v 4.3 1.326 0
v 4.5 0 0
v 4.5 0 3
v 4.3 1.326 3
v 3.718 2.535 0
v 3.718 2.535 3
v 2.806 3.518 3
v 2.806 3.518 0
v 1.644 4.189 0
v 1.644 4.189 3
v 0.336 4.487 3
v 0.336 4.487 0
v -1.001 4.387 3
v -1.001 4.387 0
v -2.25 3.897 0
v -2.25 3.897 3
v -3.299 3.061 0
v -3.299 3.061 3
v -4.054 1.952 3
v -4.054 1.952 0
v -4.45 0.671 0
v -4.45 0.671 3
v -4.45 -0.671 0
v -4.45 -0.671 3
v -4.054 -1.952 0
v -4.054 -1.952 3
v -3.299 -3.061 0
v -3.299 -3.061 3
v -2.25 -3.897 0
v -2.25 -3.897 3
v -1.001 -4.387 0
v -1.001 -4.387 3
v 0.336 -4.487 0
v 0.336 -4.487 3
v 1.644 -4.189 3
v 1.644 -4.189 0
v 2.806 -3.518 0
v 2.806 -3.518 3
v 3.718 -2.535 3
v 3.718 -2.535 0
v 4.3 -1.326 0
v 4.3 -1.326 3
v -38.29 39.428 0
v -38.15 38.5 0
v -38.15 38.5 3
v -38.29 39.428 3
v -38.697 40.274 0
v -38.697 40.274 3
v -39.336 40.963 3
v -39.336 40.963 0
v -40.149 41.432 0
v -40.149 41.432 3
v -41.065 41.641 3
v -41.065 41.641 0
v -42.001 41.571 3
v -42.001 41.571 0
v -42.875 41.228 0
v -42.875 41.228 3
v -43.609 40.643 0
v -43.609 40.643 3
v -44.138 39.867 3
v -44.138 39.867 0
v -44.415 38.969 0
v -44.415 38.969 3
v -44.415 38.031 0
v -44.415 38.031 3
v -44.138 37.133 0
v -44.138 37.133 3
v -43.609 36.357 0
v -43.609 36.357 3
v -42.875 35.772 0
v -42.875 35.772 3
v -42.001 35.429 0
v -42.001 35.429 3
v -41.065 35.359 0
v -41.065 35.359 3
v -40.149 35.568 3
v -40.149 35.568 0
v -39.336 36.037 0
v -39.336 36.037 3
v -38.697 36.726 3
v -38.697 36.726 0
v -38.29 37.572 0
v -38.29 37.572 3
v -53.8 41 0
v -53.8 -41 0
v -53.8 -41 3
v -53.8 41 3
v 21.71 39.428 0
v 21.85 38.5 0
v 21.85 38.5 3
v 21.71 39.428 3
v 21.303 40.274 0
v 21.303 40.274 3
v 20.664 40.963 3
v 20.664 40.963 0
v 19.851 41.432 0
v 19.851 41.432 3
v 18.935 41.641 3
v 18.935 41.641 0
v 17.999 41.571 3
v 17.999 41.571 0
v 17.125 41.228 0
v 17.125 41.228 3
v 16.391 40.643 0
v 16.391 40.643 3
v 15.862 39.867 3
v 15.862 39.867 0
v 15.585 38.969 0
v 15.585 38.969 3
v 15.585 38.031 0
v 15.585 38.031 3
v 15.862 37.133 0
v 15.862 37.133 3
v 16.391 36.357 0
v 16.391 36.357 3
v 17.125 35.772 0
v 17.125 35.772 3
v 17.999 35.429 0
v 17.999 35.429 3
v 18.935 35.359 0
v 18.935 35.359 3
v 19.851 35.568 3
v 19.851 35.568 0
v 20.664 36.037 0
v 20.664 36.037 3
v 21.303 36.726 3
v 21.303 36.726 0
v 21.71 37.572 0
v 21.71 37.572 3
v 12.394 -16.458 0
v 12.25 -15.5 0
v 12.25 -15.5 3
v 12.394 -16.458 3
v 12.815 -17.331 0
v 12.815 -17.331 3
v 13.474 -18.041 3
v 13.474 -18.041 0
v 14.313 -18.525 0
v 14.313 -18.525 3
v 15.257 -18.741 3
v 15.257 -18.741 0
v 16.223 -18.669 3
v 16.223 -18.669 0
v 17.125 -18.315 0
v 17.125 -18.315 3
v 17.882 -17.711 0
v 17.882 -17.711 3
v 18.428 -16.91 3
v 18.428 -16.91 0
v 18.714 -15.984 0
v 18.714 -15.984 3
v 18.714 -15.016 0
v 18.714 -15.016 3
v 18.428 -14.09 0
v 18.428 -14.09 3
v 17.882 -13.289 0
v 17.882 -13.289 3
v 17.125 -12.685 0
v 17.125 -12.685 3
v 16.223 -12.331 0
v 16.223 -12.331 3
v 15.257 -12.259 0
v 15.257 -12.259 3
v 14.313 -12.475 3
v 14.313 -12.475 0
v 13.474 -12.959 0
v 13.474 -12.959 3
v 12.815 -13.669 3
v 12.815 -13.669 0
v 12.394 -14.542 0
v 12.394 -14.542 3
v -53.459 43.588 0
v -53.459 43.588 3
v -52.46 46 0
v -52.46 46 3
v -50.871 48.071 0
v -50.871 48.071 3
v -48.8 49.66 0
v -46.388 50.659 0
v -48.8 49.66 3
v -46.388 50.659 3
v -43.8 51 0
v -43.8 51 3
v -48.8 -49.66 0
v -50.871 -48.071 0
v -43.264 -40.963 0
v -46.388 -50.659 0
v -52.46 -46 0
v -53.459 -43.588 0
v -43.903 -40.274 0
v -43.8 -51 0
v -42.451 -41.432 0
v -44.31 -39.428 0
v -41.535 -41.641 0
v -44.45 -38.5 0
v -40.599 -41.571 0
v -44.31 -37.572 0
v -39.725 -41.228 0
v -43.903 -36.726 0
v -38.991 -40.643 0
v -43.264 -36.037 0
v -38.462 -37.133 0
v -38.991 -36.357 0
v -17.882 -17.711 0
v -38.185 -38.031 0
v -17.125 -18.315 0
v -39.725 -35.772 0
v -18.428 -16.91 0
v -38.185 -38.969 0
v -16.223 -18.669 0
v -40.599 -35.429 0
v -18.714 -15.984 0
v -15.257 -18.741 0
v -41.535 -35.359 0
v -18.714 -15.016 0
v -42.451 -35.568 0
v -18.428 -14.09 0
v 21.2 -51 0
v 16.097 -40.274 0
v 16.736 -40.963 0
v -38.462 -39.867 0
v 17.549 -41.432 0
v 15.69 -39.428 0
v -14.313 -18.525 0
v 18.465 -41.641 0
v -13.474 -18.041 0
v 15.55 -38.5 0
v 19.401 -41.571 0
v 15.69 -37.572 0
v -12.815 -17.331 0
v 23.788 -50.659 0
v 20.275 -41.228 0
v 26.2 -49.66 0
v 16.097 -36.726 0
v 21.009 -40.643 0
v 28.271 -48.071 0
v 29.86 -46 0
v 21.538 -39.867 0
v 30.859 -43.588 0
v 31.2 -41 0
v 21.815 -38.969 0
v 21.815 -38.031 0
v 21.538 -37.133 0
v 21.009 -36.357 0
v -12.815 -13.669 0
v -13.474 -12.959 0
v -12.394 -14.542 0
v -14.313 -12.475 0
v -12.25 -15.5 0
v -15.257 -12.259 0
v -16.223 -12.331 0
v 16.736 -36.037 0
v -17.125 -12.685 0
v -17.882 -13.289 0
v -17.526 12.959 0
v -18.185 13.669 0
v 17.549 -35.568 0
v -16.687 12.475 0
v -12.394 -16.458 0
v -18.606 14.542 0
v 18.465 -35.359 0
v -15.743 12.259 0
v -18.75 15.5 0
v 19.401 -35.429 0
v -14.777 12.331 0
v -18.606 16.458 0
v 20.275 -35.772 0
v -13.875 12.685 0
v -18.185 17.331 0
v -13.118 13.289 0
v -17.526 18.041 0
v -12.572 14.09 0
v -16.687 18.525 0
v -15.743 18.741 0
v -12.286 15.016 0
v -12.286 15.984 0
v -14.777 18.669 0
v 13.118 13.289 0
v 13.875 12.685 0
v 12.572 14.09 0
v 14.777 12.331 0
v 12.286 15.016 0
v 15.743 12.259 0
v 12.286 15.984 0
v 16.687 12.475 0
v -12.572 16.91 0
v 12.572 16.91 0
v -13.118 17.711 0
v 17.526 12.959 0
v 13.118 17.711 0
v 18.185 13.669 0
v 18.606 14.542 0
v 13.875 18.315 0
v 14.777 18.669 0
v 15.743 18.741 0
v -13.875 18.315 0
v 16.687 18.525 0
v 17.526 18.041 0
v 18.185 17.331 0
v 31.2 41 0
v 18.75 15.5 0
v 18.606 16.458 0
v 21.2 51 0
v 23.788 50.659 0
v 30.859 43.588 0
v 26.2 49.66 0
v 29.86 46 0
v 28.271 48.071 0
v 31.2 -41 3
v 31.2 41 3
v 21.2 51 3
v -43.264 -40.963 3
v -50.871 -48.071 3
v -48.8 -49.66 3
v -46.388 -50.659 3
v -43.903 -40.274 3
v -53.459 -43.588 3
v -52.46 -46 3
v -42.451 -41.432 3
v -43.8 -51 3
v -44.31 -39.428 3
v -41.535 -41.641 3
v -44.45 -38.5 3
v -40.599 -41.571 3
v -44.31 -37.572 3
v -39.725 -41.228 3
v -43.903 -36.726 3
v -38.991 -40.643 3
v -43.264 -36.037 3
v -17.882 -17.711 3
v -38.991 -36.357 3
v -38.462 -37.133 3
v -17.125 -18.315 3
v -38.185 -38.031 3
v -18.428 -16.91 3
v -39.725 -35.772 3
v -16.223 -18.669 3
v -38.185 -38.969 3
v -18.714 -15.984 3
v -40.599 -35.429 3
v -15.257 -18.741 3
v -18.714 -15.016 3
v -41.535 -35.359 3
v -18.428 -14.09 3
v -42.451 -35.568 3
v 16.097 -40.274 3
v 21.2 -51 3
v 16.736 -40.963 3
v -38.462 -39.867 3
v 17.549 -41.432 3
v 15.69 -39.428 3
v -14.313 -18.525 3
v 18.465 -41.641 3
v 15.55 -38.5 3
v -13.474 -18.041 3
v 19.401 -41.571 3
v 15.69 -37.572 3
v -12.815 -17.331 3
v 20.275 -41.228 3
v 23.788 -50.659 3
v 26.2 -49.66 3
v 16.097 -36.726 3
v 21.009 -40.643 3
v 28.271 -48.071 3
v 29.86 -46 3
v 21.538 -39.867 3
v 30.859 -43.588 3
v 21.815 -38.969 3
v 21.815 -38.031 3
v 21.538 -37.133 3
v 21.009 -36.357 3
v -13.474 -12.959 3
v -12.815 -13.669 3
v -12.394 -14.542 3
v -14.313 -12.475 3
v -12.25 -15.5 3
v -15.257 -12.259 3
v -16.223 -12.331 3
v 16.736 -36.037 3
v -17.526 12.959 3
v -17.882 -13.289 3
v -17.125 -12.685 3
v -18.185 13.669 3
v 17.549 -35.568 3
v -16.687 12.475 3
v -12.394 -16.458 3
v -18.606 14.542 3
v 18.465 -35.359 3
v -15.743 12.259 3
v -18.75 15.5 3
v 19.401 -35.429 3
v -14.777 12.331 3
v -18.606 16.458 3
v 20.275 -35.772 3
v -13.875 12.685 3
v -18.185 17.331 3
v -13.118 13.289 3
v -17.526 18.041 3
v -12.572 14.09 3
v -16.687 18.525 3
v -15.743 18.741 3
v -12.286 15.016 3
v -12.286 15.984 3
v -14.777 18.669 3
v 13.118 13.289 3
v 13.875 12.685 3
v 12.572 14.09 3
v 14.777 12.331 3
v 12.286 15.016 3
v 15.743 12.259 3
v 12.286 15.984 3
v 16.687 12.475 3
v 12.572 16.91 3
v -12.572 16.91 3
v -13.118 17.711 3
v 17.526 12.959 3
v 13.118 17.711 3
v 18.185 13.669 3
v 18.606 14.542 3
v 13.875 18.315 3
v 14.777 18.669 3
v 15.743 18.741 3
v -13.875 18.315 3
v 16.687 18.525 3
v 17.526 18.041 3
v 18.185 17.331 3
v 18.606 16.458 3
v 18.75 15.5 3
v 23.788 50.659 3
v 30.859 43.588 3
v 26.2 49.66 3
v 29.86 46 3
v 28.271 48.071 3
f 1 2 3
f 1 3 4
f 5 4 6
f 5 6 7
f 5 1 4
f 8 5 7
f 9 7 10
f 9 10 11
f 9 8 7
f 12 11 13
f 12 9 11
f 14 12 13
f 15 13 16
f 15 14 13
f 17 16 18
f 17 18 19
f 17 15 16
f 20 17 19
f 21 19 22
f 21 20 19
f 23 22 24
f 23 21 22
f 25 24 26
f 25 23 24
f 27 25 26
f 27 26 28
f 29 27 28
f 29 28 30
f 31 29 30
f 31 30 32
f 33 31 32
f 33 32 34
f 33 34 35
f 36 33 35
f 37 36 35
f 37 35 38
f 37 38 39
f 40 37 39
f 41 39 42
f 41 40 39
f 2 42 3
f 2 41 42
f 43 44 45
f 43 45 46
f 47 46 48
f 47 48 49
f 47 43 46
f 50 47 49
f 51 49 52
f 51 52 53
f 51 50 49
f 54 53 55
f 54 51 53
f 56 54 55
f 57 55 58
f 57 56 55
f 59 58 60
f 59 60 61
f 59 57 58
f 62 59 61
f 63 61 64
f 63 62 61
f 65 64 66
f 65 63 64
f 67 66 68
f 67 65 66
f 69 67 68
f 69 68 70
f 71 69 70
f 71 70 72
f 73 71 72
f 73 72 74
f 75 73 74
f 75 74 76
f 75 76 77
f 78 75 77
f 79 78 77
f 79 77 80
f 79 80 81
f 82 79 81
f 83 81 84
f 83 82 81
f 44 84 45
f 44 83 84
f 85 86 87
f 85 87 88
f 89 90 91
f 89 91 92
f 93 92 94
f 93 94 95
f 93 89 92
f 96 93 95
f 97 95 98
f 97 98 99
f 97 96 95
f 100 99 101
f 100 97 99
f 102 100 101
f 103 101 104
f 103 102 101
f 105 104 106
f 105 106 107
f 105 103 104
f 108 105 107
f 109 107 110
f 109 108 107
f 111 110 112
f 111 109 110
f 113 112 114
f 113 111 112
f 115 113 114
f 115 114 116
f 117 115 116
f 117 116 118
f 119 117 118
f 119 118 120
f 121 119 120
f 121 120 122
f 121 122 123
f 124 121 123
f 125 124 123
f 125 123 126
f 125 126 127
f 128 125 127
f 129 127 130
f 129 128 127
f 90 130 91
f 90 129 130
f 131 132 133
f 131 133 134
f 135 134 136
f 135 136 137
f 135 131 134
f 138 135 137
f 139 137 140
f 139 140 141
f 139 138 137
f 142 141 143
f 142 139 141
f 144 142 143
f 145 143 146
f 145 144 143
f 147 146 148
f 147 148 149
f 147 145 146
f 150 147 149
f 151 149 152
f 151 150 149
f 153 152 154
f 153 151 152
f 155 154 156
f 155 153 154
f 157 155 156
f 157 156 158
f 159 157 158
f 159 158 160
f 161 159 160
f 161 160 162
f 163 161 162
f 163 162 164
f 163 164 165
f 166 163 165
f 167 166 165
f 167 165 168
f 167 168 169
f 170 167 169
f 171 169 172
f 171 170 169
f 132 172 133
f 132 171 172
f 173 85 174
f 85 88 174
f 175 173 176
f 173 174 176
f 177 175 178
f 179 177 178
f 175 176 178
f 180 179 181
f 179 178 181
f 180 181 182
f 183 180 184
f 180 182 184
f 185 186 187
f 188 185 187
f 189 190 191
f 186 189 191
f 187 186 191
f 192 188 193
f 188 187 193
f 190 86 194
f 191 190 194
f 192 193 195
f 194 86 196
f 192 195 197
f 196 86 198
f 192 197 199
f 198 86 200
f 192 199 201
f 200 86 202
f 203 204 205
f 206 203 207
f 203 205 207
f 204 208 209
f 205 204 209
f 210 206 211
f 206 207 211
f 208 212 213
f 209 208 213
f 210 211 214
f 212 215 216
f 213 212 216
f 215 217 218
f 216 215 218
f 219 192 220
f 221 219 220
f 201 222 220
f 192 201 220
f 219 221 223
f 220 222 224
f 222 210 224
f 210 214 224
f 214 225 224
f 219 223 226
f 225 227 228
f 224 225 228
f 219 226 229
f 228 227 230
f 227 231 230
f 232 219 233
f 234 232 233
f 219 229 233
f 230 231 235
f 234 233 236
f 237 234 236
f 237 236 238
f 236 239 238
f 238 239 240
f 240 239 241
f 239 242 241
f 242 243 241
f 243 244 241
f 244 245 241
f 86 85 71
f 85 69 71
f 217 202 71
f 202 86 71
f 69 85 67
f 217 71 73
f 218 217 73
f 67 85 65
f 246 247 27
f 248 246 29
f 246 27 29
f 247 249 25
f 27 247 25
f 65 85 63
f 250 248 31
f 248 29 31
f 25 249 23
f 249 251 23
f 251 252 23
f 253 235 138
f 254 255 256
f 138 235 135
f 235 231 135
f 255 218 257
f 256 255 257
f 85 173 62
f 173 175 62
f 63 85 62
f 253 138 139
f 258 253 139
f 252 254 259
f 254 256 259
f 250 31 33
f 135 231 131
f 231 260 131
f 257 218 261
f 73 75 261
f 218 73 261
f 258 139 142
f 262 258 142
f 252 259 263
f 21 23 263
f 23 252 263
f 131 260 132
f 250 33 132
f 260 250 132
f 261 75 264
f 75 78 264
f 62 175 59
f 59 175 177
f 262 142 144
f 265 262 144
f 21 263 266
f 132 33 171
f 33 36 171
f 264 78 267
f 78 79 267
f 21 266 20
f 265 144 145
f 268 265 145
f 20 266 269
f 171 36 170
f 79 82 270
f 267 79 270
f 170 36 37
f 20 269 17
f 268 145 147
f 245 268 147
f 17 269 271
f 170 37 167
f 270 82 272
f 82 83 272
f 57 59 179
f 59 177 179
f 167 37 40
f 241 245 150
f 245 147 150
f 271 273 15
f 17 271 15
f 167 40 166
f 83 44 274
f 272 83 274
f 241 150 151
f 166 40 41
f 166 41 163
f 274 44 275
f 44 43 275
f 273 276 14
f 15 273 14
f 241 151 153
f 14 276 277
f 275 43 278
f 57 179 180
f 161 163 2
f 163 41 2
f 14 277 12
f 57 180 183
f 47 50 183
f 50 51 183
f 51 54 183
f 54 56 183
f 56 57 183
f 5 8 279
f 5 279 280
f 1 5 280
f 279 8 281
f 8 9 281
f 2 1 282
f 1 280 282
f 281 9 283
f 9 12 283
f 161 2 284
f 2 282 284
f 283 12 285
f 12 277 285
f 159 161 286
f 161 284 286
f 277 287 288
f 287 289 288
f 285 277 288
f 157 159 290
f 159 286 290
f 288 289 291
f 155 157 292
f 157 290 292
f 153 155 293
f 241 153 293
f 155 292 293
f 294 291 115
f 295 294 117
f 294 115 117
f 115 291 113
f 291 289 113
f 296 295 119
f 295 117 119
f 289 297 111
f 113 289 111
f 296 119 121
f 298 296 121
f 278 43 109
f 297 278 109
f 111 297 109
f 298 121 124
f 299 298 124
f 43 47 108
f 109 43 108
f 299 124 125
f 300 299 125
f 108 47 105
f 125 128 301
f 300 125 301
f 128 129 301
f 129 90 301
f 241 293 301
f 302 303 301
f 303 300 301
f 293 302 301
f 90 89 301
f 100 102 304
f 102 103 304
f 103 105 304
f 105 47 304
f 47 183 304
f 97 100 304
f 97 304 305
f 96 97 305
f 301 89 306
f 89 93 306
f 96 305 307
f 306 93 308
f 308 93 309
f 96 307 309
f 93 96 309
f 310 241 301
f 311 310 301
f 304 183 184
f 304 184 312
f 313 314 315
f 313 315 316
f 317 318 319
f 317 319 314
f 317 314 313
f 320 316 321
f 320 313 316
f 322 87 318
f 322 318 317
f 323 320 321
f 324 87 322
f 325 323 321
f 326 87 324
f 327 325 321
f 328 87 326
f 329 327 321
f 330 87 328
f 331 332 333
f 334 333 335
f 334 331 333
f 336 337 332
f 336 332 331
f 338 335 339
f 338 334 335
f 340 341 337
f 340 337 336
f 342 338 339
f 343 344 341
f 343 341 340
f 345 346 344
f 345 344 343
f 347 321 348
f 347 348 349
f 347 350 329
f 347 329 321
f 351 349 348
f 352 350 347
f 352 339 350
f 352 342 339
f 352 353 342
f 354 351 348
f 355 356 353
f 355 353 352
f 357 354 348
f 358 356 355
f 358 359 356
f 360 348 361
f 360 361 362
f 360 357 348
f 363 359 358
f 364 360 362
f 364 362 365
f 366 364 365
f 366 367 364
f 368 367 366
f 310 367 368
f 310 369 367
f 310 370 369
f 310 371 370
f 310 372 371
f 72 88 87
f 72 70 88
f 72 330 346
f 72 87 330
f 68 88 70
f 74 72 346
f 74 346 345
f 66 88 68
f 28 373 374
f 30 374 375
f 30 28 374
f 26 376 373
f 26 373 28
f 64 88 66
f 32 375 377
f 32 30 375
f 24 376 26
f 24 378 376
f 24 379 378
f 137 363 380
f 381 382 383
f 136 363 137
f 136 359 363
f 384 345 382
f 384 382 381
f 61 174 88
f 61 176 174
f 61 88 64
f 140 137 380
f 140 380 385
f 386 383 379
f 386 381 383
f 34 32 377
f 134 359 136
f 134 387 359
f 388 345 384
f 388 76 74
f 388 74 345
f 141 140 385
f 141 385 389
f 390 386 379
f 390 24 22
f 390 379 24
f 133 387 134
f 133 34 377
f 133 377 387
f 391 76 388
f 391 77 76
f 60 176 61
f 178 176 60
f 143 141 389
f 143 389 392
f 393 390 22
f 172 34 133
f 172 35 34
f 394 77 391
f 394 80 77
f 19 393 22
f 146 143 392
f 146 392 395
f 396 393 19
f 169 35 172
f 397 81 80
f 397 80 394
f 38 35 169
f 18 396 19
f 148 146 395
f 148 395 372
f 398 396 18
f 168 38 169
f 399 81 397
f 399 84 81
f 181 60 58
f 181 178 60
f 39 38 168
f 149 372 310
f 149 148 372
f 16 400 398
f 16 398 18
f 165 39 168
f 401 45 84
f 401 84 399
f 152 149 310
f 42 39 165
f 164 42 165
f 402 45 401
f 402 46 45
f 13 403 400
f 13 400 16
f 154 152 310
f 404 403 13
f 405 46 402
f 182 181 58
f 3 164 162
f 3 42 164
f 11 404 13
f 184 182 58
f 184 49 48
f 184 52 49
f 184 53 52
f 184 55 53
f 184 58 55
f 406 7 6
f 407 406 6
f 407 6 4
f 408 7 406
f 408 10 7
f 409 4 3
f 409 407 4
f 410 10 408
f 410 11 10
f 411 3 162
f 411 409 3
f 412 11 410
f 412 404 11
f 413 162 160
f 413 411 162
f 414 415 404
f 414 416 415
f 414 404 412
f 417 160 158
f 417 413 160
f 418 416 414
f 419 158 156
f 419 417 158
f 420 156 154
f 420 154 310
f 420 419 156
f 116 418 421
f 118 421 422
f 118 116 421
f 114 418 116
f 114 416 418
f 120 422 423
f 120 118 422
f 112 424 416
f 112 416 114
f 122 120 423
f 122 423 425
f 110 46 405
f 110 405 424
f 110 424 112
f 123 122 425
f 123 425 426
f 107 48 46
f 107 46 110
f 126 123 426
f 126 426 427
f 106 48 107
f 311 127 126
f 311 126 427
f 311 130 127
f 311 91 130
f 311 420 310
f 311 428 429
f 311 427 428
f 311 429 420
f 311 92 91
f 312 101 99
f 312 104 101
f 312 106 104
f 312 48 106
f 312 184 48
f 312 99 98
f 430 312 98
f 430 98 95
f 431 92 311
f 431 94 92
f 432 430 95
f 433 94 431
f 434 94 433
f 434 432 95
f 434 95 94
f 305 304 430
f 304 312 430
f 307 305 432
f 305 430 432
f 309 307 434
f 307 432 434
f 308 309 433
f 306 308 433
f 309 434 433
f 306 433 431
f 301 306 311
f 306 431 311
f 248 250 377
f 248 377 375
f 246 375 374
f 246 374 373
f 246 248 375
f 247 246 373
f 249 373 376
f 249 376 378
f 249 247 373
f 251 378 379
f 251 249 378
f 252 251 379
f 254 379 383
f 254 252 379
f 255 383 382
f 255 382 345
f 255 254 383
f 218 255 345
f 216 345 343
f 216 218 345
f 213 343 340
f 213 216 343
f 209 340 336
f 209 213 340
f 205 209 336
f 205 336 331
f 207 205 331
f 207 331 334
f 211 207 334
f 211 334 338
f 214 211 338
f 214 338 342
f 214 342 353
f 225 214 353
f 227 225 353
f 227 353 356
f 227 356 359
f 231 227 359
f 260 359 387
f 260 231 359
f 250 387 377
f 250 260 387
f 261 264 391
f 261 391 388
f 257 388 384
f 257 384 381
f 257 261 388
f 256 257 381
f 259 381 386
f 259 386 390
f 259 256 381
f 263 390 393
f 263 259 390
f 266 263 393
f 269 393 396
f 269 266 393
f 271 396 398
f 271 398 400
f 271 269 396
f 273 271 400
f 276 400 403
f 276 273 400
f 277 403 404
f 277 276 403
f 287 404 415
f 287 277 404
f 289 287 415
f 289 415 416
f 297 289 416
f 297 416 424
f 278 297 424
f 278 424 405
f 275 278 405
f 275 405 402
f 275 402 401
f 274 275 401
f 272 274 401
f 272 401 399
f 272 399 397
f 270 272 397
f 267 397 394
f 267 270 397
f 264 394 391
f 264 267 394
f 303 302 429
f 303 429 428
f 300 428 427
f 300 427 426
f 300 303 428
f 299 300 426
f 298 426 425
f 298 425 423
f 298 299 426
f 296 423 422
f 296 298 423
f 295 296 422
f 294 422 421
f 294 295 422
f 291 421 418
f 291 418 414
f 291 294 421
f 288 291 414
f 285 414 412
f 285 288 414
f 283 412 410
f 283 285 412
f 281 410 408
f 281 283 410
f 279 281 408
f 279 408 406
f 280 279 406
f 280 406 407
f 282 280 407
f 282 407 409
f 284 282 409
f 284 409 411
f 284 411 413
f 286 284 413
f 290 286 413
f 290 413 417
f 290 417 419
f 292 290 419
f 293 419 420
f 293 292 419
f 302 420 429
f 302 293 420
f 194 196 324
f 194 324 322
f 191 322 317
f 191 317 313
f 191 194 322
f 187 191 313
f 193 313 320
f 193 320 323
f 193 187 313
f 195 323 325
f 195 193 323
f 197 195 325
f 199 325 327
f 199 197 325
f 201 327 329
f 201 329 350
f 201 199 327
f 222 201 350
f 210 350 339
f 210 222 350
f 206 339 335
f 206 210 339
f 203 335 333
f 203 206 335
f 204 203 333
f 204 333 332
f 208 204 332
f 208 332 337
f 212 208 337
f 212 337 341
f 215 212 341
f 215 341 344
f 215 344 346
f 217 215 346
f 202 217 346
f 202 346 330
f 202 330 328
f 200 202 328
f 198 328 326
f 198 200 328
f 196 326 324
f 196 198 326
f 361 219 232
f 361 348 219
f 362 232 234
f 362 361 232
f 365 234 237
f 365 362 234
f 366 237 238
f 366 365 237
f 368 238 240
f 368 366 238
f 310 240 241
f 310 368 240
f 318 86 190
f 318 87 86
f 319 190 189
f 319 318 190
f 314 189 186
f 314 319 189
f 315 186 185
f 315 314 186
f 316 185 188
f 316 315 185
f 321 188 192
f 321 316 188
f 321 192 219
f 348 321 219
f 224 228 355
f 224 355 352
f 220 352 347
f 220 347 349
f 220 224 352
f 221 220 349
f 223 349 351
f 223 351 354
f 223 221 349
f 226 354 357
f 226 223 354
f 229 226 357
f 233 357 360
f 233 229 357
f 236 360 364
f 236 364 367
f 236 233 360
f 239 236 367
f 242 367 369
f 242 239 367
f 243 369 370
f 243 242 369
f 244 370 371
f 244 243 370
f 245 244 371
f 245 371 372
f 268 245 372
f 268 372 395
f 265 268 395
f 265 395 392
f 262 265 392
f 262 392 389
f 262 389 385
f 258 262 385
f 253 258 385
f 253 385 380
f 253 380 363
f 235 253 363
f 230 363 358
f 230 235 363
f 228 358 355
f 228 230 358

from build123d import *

# Parameters (mm, degrees)
CROQUIS1_W              = 85
CROQUIS1_H              = 102
CROQUIS1_R              = 4.5
CROQUIS1_R_2            = 3.25
CROQUIS1_R_3            = 3.15
SALIENTE_EXTRUIR1_DEPTH = 3
REDONDEO1_R             = 10


with BuildPart() as part:
    # Croquis1 → Saliente-Extruir1 (new body)
    with BuildSketch(Plane.XY):
        with Locations((-11.3, 0)):
            Rectangle(CROQUIS1_W, CROQUIS1_H)
        Circle(CROQUIS1_R, mode=Mode.SUBTRACT)
        with Locations((15.5, 15.5)):
            Circle(CROQUIS1_R_2, mode=Mode.SUBTRACT)
        with Locations(Location((-15.5, 15.5, 0), (0, 0, 180))):
            Circle(CROQUIS1_R_2, mode=Mode.SUBTRACT)
        with Locations(Location((15.5, -15.5, 0), (0, 0, 180))):
            Circle(CROQUIS1_R_2, mode=Mode.SUBTRACT)
        with Locations((-15.5, -15.5)):
            Circle(CROQUIS1_R_2, mode=Mode.SUBTRACT)
        with Locations((-41.3, 38.5)):
            Circle(CROQUIS1_R_3, mode=Mode.SUBTRACT)
        with Locations((18.7, 38.5)):
            Circle(CROQUIS1_R_3, mode=Mode.SUBTRACT)
        with Locations(Location((18.7, -38.5, 0), (0, 0, 180))):
            Circle(CROQUIS1_R_3, mode=Mode.SUBTRACT)
        with Locations(Location((-41.3, -38.5, 0), (0, 0, 180))):
            Circle(CROQUIS1_R_3, mode=Mode.SUBTRACT)
    extrude(amount=SALIENTE_EXTRUIR1_DEPTH)

    # Redondeo1
    redondeo1_edges = [part.edges().sort_by_distance(p)[0] for p in [
        (-53.8, 51, 1.5),
        (31.2, 51, 1.5),
        (31.2, -51, 1.5),
        (-53.8, -51, 1.5),
    ]]
    fillet(redondeo1_edges, radius=REDONDEO1_R)


solid = part.part
